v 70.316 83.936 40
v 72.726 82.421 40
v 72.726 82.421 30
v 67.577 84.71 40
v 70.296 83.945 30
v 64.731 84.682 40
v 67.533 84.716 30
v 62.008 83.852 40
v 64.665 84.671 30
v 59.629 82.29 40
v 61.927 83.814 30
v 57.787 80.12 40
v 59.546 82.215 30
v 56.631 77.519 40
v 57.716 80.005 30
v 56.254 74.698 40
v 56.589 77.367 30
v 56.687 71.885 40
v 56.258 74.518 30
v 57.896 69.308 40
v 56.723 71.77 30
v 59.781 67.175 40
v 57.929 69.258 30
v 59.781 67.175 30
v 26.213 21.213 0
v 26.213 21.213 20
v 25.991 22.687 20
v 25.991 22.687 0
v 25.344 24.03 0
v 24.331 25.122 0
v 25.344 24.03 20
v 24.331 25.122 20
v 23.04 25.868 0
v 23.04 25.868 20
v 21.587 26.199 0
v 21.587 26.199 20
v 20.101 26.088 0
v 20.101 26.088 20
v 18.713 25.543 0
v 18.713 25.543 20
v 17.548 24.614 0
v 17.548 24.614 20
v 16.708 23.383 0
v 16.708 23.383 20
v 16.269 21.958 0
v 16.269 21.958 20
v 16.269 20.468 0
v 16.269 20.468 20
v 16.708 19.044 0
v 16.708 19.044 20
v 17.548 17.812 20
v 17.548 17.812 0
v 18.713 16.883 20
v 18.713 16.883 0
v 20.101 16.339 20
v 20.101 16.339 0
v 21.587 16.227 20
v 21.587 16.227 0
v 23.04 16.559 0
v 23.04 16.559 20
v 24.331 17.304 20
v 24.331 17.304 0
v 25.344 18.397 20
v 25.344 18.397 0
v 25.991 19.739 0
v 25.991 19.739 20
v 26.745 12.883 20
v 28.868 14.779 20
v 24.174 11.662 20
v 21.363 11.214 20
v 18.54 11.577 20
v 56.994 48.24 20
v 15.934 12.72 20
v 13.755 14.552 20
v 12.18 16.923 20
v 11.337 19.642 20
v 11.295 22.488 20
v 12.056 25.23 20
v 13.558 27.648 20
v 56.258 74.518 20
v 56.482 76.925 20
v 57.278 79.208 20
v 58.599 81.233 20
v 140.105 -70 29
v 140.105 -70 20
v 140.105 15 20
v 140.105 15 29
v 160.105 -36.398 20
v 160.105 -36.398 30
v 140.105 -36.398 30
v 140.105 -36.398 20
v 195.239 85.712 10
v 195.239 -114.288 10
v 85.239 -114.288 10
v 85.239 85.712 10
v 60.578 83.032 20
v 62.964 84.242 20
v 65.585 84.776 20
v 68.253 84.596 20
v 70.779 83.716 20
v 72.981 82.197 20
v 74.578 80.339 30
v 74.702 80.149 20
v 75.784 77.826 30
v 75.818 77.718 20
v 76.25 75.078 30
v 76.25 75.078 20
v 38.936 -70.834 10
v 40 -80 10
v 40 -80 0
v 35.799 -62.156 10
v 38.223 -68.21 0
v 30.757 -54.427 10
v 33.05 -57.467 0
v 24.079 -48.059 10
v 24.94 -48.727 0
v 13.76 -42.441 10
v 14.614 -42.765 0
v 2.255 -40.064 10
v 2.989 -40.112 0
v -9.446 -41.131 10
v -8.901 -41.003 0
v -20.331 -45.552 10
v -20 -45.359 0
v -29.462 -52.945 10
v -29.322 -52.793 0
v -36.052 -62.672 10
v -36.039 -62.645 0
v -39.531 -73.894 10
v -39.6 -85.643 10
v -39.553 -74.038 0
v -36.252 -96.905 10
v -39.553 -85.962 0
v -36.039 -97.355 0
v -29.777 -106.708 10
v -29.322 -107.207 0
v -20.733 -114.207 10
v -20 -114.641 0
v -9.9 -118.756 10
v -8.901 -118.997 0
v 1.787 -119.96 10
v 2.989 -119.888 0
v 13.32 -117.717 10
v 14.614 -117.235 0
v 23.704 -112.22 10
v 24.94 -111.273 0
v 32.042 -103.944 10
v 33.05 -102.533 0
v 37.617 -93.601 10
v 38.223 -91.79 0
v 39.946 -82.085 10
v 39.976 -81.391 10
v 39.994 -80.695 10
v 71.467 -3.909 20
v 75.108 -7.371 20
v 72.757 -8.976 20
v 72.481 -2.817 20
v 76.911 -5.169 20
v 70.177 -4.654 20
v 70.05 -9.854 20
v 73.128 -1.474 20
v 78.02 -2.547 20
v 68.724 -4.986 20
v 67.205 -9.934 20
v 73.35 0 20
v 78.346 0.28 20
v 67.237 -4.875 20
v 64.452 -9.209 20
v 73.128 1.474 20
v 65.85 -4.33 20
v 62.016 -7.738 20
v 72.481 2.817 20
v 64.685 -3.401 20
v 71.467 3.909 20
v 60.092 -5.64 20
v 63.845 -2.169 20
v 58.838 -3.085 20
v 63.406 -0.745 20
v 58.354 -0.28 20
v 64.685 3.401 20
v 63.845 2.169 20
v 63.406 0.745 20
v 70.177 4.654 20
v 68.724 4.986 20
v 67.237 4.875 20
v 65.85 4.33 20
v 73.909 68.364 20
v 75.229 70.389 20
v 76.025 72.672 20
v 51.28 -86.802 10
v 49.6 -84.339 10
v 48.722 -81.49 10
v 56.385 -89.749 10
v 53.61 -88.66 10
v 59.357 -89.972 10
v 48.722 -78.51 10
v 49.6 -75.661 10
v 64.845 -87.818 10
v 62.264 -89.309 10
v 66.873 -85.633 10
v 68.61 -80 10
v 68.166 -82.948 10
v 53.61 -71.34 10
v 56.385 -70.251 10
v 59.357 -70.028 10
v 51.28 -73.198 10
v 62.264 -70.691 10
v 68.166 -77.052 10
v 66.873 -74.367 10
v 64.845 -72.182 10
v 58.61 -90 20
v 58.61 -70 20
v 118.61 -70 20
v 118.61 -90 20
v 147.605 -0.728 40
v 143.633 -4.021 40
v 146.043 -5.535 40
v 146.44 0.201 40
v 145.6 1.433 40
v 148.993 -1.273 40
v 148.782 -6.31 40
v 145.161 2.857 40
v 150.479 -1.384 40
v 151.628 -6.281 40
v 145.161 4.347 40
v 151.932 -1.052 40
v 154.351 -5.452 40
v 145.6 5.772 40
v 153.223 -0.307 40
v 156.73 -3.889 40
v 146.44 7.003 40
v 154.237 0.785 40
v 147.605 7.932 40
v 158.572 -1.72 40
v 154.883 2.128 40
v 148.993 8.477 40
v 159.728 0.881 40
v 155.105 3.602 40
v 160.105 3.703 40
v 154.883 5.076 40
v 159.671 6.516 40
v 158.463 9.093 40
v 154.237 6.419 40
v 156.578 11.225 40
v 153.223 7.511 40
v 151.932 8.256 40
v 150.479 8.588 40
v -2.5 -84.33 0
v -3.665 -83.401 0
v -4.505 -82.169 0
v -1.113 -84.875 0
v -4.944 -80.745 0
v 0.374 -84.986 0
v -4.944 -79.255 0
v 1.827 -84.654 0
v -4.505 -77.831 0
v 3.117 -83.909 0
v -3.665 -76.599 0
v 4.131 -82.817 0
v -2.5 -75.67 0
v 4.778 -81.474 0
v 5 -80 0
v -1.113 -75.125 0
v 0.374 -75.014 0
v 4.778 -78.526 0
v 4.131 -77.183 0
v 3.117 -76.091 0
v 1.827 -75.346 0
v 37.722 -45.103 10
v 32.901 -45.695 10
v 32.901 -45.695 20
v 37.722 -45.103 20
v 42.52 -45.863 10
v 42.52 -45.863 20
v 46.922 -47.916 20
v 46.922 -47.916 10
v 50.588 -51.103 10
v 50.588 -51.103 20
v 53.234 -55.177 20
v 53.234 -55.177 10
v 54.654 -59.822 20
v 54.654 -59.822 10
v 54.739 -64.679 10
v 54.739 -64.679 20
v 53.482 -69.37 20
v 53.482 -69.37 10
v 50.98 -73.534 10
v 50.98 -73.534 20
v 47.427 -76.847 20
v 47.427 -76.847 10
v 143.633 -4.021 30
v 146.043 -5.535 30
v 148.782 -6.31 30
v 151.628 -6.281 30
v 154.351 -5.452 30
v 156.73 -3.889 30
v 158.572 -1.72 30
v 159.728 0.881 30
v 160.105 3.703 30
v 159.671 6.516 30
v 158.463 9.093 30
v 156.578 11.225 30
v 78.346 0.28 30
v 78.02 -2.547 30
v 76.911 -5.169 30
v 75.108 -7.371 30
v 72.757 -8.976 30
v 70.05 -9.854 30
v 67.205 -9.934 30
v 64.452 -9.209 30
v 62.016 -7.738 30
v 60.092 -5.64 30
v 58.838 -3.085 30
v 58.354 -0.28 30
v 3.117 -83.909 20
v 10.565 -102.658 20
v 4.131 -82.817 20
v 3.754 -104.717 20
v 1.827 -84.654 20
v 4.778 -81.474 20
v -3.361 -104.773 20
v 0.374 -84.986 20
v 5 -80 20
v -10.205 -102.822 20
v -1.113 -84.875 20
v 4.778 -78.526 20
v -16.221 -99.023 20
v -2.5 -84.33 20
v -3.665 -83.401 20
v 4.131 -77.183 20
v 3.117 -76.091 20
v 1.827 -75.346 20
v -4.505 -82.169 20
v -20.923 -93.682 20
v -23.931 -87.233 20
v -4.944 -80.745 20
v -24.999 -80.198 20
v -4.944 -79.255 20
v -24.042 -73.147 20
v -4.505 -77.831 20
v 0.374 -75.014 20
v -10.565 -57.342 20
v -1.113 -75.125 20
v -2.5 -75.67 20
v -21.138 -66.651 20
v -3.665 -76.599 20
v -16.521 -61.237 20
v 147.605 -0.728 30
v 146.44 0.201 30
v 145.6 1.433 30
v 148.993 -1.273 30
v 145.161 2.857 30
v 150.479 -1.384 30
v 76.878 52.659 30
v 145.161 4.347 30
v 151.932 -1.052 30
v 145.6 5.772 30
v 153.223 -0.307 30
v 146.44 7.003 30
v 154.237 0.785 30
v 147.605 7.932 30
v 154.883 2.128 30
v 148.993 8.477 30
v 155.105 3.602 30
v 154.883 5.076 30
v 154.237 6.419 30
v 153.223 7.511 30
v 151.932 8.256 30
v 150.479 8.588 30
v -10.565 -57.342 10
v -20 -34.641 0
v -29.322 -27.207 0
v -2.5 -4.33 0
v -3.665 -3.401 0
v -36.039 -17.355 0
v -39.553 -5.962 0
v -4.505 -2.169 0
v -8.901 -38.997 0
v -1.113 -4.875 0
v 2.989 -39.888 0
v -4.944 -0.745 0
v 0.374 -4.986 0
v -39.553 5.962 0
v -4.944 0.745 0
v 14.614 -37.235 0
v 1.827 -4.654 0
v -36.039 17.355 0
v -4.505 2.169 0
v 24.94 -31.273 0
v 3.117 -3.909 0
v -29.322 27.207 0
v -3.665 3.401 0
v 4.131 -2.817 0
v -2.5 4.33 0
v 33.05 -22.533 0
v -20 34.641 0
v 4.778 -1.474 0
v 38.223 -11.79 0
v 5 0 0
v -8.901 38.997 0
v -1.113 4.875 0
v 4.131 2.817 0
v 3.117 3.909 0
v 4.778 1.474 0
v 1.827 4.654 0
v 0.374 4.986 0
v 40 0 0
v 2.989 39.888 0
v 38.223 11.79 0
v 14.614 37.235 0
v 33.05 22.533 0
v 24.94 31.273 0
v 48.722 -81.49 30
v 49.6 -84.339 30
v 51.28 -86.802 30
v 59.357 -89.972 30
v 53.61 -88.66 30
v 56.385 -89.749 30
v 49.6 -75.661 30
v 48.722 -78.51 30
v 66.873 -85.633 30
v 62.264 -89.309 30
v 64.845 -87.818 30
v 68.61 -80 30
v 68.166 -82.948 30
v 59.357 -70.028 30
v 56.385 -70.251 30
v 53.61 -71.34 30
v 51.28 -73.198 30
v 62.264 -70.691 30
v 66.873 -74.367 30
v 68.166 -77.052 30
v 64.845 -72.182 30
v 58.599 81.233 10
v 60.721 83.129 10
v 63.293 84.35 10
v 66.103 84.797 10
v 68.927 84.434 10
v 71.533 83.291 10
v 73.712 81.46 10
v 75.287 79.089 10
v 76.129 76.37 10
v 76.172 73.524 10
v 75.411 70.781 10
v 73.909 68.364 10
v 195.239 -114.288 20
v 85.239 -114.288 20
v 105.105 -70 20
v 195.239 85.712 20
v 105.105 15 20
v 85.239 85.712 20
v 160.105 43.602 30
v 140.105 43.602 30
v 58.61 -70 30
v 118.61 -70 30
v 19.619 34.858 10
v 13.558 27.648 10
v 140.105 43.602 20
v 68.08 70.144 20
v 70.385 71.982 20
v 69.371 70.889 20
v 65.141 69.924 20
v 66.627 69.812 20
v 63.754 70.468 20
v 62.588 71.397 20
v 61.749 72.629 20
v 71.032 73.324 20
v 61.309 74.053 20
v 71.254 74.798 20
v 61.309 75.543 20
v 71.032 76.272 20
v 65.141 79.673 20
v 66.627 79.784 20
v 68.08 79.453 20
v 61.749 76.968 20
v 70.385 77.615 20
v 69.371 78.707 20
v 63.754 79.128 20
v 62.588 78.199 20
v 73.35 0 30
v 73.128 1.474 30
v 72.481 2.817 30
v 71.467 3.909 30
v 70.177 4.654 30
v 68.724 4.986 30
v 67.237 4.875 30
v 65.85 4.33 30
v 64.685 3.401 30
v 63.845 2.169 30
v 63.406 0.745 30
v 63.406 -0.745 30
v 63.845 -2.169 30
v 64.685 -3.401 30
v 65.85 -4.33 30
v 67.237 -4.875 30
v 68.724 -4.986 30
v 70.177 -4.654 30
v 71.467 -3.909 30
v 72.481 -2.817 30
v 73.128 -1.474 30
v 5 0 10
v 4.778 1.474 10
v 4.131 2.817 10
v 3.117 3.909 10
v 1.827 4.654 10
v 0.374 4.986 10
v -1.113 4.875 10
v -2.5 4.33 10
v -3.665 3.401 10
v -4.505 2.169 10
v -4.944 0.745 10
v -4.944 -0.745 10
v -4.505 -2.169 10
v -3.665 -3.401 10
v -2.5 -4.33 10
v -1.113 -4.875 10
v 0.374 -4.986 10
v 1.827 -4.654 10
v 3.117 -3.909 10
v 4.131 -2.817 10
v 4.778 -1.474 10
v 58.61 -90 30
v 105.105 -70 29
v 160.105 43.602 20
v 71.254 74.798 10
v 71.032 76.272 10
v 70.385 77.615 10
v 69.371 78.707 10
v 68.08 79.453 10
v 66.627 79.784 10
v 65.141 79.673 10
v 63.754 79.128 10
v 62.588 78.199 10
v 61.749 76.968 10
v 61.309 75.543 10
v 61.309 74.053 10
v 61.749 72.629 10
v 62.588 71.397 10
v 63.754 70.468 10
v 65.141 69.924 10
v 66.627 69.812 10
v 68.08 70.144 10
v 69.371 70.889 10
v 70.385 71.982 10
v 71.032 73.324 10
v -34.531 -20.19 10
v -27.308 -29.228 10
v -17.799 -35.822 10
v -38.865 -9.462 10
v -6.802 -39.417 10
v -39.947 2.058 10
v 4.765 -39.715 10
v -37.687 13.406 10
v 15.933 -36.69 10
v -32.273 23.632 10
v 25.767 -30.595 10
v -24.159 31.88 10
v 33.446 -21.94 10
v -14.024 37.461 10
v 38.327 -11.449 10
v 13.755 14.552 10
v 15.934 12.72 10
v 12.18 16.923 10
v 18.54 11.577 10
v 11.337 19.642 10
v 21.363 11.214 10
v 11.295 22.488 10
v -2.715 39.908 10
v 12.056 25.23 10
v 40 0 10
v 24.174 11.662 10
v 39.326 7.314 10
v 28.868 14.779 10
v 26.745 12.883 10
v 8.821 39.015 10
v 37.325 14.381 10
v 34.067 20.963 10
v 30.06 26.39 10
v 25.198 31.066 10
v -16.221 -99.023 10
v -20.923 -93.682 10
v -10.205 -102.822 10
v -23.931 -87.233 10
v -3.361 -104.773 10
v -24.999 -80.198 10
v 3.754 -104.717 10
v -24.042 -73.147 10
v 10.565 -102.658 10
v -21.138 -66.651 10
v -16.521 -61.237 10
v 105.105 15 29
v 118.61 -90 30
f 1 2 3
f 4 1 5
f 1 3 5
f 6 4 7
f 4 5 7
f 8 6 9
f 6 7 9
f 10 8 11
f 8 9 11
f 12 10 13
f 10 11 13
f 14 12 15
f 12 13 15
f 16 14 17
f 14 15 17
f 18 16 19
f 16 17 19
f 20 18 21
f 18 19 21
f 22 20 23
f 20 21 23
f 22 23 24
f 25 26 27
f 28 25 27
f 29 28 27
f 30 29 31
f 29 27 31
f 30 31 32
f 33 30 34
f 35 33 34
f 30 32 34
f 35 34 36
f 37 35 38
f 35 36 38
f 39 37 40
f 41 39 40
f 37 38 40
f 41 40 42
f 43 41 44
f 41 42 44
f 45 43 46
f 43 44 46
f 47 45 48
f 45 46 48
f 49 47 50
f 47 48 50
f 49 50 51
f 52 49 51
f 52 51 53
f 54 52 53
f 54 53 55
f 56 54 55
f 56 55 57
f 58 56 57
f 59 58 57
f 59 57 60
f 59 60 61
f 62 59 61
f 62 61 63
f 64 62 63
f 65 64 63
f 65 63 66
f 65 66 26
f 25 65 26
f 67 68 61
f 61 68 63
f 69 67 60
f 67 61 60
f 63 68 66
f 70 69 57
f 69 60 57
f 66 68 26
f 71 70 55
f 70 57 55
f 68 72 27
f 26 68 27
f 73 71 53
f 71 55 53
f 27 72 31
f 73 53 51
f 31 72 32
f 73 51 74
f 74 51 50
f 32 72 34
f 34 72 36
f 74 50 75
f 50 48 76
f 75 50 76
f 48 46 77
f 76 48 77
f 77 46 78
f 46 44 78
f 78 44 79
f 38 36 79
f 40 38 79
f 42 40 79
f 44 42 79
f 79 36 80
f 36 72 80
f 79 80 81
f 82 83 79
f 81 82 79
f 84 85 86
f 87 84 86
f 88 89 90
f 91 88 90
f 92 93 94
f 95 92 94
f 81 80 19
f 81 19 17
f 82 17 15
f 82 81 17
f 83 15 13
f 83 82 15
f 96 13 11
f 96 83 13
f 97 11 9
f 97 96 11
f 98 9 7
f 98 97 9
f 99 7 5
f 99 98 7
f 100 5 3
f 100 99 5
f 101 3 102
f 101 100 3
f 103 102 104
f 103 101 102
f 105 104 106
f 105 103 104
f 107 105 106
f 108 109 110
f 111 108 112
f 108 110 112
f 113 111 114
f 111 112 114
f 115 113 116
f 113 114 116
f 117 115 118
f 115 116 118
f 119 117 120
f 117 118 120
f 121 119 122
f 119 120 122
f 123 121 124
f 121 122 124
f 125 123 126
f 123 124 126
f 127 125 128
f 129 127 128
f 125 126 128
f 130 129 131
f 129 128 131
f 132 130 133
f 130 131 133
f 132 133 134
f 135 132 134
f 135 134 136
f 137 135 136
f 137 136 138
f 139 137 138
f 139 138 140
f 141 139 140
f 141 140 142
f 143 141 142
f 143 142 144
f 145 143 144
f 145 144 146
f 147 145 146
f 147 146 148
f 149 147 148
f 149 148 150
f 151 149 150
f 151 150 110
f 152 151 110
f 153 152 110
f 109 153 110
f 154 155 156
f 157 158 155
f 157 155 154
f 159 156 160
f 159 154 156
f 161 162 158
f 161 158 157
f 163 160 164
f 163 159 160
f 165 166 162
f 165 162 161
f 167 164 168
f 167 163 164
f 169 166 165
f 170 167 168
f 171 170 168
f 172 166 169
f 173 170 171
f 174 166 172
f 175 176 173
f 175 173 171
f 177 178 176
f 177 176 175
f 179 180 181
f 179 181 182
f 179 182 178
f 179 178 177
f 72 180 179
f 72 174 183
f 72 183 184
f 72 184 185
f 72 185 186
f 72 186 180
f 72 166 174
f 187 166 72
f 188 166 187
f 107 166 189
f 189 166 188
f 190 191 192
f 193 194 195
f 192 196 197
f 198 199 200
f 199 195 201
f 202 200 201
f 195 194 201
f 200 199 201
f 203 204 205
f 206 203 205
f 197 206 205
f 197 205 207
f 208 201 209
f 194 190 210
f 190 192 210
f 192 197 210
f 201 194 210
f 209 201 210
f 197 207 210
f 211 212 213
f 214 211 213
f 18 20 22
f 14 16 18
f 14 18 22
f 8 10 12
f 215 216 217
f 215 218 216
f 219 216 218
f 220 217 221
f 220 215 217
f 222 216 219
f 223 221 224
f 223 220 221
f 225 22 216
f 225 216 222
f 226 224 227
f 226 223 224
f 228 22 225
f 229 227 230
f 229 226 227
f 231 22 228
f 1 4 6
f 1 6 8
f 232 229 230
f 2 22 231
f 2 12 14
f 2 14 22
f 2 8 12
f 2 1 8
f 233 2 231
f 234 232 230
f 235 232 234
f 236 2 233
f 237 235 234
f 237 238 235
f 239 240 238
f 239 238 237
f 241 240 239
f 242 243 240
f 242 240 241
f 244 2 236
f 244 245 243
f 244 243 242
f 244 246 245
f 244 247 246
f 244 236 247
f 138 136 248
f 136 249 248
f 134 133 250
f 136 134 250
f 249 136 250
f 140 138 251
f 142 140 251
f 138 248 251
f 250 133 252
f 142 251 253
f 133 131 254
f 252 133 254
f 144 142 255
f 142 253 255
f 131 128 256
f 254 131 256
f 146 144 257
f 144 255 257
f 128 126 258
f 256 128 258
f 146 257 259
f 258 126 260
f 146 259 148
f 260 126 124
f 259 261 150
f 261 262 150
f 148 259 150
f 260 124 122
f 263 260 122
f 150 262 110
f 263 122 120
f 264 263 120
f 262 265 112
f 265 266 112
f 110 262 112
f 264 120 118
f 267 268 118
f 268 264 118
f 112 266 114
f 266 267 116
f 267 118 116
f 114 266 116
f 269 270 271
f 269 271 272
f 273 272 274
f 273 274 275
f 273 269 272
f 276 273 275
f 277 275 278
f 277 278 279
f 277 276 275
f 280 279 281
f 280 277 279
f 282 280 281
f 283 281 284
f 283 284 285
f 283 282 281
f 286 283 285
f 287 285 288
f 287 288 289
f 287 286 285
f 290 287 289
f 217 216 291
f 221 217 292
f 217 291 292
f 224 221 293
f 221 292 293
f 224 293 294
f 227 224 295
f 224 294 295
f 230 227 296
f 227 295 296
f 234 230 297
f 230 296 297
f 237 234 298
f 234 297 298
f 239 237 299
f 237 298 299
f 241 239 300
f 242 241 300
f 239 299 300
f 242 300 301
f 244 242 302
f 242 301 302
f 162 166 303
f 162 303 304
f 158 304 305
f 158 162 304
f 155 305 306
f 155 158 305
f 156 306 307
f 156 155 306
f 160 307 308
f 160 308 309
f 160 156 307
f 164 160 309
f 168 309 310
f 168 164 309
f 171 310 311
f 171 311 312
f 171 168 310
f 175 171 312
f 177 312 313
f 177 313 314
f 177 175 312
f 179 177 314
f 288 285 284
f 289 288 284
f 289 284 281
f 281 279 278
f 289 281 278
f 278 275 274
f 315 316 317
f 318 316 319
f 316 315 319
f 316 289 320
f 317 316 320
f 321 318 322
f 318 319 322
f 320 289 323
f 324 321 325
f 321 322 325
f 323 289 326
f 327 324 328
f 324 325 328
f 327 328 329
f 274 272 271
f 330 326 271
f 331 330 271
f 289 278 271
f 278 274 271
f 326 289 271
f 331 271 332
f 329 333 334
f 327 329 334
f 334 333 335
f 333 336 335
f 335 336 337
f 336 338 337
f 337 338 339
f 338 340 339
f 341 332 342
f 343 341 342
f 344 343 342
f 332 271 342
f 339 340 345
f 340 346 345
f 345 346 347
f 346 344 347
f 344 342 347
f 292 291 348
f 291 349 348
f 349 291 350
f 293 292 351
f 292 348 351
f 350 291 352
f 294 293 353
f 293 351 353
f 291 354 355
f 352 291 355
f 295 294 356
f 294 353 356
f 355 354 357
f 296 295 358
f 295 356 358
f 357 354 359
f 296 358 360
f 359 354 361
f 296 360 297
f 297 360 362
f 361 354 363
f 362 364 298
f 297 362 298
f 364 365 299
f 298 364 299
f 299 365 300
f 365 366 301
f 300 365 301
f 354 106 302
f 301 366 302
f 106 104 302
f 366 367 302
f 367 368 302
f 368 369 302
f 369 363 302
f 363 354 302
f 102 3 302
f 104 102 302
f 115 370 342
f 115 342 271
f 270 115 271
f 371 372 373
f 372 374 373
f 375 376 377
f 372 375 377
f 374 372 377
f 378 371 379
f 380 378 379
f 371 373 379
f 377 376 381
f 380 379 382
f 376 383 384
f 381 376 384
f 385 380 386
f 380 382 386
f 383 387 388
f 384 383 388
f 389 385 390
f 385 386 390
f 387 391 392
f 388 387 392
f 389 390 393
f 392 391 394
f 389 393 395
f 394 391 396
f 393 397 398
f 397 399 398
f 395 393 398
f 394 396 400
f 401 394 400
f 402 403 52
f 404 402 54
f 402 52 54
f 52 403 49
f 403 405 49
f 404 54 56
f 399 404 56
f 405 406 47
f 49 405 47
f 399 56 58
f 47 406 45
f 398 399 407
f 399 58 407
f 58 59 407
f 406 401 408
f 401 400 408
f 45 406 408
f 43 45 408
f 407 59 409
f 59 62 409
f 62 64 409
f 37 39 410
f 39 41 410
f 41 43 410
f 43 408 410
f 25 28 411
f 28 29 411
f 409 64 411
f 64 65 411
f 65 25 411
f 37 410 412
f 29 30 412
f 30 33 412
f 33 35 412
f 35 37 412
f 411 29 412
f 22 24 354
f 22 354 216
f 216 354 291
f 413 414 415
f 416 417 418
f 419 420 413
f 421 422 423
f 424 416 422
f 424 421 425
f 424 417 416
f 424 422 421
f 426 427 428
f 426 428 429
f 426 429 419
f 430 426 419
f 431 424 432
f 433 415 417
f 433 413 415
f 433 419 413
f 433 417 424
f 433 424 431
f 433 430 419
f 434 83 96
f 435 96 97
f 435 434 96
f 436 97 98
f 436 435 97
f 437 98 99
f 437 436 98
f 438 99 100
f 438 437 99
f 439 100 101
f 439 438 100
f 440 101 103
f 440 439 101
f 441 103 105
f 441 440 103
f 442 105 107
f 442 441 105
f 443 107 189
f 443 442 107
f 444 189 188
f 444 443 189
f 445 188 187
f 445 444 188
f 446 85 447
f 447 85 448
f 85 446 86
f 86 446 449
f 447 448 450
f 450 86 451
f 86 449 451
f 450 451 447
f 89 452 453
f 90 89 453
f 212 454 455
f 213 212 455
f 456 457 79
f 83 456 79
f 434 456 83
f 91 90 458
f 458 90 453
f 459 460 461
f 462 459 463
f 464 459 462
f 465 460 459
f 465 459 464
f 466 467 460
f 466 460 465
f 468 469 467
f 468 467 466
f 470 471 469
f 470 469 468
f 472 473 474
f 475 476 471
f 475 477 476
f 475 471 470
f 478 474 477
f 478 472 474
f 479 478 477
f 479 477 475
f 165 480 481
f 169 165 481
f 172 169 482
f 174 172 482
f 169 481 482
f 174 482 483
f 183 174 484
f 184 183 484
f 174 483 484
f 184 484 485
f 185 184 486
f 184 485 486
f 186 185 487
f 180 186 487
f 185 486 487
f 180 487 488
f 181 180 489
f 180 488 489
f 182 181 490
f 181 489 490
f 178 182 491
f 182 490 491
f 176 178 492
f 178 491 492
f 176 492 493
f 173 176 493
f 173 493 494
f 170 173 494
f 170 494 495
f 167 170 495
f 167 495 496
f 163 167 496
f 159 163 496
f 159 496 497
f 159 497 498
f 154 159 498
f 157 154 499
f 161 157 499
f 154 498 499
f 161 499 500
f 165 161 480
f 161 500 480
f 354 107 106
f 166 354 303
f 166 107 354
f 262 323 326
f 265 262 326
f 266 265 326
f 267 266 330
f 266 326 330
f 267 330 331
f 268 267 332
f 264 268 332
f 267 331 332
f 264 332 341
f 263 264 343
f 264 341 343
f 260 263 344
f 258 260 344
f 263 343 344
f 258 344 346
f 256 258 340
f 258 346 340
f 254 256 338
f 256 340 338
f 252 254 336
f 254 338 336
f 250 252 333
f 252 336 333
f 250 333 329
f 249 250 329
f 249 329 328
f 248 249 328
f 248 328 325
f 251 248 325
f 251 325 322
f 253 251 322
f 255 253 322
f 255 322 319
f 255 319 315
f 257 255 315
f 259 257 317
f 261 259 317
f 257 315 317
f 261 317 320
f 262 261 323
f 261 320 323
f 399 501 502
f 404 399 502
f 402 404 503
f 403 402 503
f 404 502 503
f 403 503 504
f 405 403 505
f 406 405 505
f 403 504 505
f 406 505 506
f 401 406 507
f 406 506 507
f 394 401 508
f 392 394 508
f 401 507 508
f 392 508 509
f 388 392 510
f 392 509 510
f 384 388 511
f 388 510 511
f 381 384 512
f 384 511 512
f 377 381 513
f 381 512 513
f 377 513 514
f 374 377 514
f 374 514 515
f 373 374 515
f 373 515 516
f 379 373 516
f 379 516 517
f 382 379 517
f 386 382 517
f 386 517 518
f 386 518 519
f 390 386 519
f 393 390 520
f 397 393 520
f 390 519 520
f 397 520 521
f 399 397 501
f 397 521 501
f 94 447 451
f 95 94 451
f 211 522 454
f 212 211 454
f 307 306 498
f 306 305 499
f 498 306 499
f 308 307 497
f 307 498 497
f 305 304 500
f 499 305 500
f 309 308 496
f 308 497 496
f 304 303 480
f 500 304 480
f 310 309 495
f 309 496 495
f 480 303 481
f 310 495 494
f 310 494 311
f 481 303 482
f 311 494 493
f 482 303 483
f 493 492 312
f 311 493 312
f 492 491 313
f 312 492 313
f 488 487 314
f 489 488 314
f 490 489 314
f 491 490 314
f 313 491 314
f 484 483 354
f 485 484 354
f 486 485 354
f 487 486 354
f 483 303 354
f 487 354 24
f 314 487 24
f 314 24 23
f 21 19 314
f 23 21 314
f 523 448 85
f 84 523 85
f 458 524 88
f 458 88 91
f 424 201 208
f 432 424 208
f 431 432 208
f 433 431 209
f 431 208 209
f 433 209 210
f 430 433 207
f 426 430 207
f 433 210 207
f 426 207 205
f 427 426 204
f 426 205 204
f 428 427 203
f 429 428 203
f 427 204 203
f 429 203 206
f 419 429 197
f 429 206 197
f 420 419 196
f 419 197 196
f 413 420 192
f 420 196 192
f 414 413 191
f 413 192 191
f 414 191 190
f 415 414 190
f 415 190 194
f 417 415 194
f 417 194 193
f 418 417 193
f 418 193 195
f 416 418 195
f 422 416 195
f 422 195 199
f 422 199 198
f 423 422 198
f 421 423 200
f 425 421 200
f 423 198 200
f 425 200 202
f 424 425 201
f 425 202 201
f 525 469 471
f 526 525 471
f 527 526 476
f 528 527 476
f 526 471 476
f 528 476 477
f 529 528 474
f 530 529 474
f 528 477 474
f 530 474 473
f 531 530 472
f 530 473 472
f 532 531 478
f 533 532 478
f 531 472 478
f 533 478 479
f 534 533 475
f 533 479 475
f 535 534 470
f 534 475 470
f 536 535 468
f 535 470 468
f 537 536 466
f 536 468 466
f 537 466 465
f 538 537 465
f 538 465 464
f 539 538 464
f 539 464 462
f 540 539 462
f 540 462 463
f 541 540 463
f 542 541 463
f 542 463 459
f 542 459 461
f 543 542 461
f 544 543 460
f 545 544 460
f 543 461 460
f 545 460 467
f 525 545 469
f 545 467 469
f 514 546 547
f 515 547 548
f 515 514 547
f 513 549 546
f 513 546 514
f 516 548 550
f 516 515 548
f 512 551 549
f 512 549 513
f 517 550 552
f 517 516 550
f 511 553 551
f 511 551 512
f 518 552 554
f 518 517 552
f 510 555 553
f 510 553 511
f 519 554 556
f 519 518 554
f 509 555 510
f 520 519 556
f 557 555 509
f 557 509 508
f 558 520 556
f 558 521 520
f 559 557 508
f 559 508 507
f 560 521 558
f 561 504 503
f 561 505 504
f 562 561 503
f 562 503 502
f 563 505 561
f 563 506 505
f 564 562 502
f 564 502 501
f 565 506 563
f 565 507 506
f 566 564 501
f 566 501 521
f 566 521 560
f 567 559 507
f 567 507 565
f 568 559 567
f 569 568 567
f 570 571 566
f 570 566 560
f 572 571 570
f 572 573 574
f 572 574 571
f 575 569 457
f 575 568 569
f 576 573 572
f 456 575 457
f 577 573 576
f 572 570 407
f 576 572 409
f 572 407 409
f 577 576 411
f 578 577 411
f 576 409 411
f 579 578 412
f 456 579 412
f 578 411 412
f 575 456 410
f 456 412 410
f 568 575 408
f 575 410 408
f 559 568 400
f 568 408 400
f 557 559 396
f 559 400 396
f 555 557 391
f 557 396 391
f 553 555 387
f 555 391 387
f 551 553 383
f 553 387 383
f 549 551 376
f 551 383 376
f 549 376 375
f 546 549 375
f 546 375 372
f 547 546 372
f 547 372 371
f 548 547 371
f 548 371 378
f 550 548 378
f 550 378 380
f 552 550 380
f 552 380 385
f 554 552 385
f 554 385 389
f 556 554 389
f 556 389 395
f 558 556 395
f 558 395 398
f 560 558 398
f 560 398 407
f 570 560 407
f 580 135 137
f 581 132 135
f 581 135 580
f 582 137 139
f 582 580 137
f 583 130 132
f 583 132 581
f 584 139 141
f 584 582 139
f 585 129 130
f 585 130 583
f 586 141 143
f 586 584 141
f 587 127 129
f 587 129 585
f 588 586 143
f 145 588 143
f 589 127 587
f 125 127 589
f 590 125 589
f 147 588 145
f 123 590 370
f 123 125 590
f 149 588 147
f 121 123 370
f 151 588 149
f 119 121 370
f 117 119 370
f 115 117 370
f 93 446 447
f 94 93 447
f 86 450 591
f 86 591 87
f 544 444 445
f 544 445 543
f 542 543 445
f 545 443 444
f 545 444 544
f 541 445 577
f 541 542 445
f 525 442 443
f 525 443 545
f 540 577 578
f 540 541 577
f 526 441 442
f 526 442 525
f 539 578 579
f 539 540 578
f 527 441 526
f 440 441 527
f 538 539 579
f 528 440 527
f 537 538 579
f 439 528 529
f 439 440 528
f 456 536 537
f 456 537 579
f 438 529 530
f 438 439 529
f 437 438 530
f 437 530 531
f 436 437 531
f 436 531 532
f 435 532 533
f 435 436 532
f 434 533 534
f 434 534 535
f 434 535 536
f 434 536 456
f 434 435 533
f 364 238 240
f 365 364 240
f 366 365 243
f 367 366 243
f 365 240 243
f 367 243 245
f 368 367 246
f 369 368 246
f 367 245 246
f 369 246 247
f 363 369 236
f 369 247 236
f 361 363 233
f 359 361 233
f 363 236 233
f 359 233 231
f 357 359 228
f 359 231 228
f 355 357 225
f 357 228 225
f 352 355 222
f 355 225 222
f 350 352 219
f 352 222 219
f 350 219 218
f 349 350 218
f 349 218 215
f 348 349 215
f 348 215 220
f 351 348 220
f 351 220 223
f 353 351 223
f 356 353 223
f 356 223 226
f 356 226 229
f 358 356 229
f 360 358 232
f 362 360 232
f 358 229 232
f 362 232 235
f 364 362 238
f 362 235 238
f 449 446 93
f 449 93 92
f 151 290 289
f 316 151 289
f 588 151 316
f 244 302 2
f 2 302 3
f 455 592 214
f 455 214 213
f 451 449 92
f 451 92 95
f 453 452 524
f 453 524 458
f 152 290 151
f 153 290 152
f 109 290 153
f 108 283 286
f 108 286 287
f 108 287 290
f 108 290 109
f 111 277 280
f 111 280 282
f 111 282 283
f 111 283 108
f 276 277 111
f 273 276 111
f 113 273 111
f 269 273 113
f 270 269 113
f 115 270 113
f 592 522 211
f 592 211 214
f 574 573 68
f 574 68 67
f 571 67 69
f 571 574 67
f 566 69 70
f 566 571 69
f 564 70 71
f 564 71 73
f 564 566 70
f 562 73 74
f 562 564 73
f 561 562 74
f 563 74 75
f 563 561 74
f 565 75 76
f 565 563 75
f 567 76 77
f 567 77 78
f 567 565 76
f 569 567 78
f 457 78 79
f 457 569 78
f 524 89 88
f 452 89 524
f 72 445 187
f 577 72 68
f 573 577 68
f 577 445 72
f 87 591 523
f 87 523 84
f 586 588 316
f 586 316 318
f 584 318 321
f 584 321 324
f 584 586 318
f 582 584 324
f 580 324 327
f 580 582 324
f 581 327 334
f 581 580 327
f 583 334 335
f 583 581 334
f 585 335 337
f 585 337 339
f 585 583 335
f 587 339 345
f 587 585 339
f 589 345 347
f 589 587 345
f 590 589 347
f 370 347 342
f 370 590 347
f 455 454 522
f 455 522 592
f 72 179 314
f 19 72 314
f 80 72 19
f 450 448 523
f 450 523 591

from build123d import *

# Parameters (mm, degrees)
SKETCH_1_R          = 40
EXTRUDE_1_DEPTH     = 10
SKETCH_2_R          = 40
EXTRUDE_2_DEPTH     = 10
EXTRUDE_3_DEPTH     = 10
EXTRUDE_START       = 10
SKETCH_4_R          = 10
EXTRUDE_4_DEPTH     = 20
SKETCH_5_W          = 60
SKETCH_5_H          = 20
EXTRUDE_5_DEPTH     = 10
SKETCH_6_R          = 5
CUT_EXTRUDE_1_DEPTH = 10
EXTRUDE_6_DEPTH     = 10
SKETCH_8_R          = 5
CUT_EXTRUDE_2_DEPTH = 10
EXTRUDE_7_DEPTH     = 10
EXTRUDE_9_DEPTH     = 10
SKETCH_12_R         = 5
CUT_EXTRUDE_3_DEPTH = 10
SKETCH_13_R         = 5
CUT_EXTRUDE_4_DEPTH = 10
SKETCH_14_R         = 5
CUT_EXTRUDE_5_DEPTH = 10
SKETCH_15_W         = 20
SKETCH_15_H         = 80
EXTRUDE_10_DEPTH    = 10
SKETCH_16_W         = 110
SKETCH_16_H         = 200
EXTRUDE_11_DEPTH    = 10
SKETCH_17_W         = 35
SKETCH_17_H         = 85
EXTRUDE_12_DEPTH    = 9
SKETCH_18_R         = 5
CUT_EXTRUDE_6_DEPTH = 10
SKETCH_19_R         = 5
CUT_EXTRUDE_7_DEPTH = 20


with BuildPart() as part:
    # 草图1 → 凸台-拉伸1 (new body)
    with BuildSketch(Plane.XY):
        Circle(SKETCH_1_R)
    extrude(amount=EXTRUDE_1_DEPTH)

    # 草图6 → 切除-拉伸1 (cut)
    with BuildSketch(Plane.XY.offset(10)):
        with Locations((21.213203436, 21.213203436)):
            Circle(SKETCH_6_R)
    extrude(amount=-CUT_EXTRUDE_1_DEPTH, mode=Mode.SUBTRACT)

    # 草图7 → 凸台-拉伸6 (add)
    with BuildSketch(Plane.XY.offset(10)):
        with BuildLine():
            Line((13.558194714, 27.647552002), (58.598634676, 81.232613054))
            ThreePointArc((58.598634676, 81.232613054), (72.687991964, 82.45327321), (73.90865212, 68.363915922))
            Line((73.90865212, 68.363915922), (28.868212157, 14.77885487))
            ThreePointArc((28.868212157, 14.77885487), (14.77885487, 13.558194714), (13.558194714, 27.647552002))
        make_face()
    extrude(amount=EXTRUDE_6_DEPTH)

    # 草图8 → 切除-拉伸2 (cut)
    with BuildSketch(Plane.XY.offset(20)):
        with Locations((66.253643398, 74.798264488)):
            Circle(SKETCH_8_R)
    extrude(amount=-CUT_EXTRUDE_2_DEPTH, mode=Mode.SUBTRACT)

    # 草图9 → 凸台-拉伸7 (add)
    with BuildSketch(Plane.XY.offset(20)):
        with BuildLine():
            Line((58.353926544, -0.280158249), (56.2575686, 74.518106239))
            ThreePointArc((56.2575686, 74.518106239), (65.973485149, 84.794339286), (76.249718195, 75.078422737))
            Line((76.249718195, 75.078422737), (78.346076139, 0.280158249))
            ThreePointArc((78.346076139, 0.280158249), (68.630159591, -9.996074797), (58.353926544, -0.280158249))
        make_face()
    extrude(amount=EXTRUDE_7_DEPTH)

    # 草图10 → 凸台-拉伸9 (add)
    with BuildSketch(Plane.XY.offset(30)):
        with BuildLine():
            Line((59.781263903, 67.175384214), (143.632946923, -4.020790225))
            ThreePointArc((143.632946923, -4.020790225), (157.728206692, -2.870289445), (156.577705912, 11.224970324))
            Line((156.577705912, 11.224970324), (72.726022892, 82.421144763))
            ThreePointArc((72.726022892, 82.421144763), (58.630763123, 81.270643983), (59.781263903, 67.175384214))
        make_face()
    extrude(amount=EXTRUDE_9_DEPTH)

    # 草图12 → 切除-拉伸3 (cut)
    with BuildSketch(Plane.XY.offset(30)):
        with Locations((68.350001342, 0)):
            Circle(SKETCH_12_R)
    extrude(amount=-CUT_EXTRUDE_3_DEPTH, mode=Mode.SUBTRACT)

    # 草图13 → 切除-拉伸4 (cut)
    with BuildSketch(Plane.XY.offset(20)):
        with Locations((21.213203436, 21.213203436)):
            Circle(SKETCH_13_R)
    extrude(amount=-CUT_EXTRUDE_4_DEPTH, mode=Mode.SUBTRACT)

    # 草图14 → 切除-拉伸5 (cut)
    with BuildSketch(Plane.XY.offset(40)):
        with Locations((150.105326418, 3.602090049)):
            Circle(SKETCH_14_R)
    extrude(amount=-CUT_EXTRUDE_5_DEPTH, mode=Mode.SUBTRACT)

    # 草图18 → 切除-拉伸6 (cut)
    with BuildSketch(Plane.XY.offset(10)):
        Circle(SKETCH_18_R)
    extrude(amount=-CUT_EXTRUDE_6_DEPTH, mode=Mode.SUBTRACT)


with BuildPart() as body_2:
    # 草图2 → 凸台-拉伸2 (new body)
    with BuildSketch(Plane.XY):
        with Locations((0, -80)):
            Circle(SKETCH_2_R)
    extrude(amount=EXTRUDE_2_DEPTH)

    # 草图3 → 凸台-拉伸3 (add)
    with BuildSketch(Plane.XY.offset(10)):
        with BuildLine():
            Line((-10.565456544, -57.342305324), (32.901205639, -45.695448294))
            ThreePointArc((32.901205639, -45.695448294), (53.233777088, -55.176682071), (47.427298537, -76.84675504))
            Line((47.427298537, -76.84675504), (10.565456544, -102.657694676))
            ThreePointArc((10.565456544, -102.657694676), (-22.657694676, -90.565456544), (-10.565456544, -57.342305324))
        make_face()
    extrude(amount=EXTRUDE_3_DEPTH)

    # 草图19 → 切除-拉伸7 (cut)
    with BuildSketch(Plane.XY.offset(20)):
        with Locations((0, -80)):
            Circle(SKETCH_19_R)
    extrude(amount=-CUT_EXTRUDE_7_DEPTH, mode=Mode.SUBTRACT)


with BuildPart() as body_3:
    # 草图4 → 凸台-拉伸4 (new body)
    with BuildSketch(Plane.XY.offset(EXTRUDE_START)):
        with Locations((58.610156078, -80)):
            Circle(SKETCH_4_R)
    extrude(amount=EXTRUDE_4_DEPTH)


with BuildPart() as body_4:
    # 草图5 → 凸台-拉伸5 (new body)
    with BuildSketch(Plane.XY.offset(30)):
        with Locations((88.610156078, -80)):
            Rectangle(SKETCH_5_W, SKETCH_5_H)
    extrude(amount=-EXTRUDE_5_DEPTH)


with BuildPart() as body_5:
    # 草图15 → 凸台-拉伸10 (new body)
    with BuildSketch(Plane(origin=(0, 0, 30), x_dir=(-1, 0, 0), z_dir=(0, 0, -1))):
        with Locations((-150.105326418, 3.602090049)):
            Rectangle(SKETCH_15_W, SKETCH_15_H)
    extrude(amount=EXTRUDE_10_DEPTH)


with BuildPart() as body_6:
    # 草图16 → 凸台-拉伸11 (new body)
    with BuildSketch(Plane(origin=(0, 0, 20), x_dir=(-1, 0, 0), z_dir=(0, 0, -1))):
        with Locations((-140.23897141, -14.288466448)):
            Rectangle(SKETCH_16_W, SKETCH_16_H)
    extrude(amount=EXTRUDE_11_DEPTH)

    # 草图17 → 凸台-拉伸12 (add)
    with BuildSketch(Plane.XY.offset(20)):
        with Locations((122.605326418, -27.5)):
            Rectangle(SKETCH_17_W, SKETCH_17_H)
    extrude(amount=EXTRUDE_12_DEPTH)


solid = Compound([part.part, body_2.part, body_3.part, body_4.part, body_5.part, body_6.part])
